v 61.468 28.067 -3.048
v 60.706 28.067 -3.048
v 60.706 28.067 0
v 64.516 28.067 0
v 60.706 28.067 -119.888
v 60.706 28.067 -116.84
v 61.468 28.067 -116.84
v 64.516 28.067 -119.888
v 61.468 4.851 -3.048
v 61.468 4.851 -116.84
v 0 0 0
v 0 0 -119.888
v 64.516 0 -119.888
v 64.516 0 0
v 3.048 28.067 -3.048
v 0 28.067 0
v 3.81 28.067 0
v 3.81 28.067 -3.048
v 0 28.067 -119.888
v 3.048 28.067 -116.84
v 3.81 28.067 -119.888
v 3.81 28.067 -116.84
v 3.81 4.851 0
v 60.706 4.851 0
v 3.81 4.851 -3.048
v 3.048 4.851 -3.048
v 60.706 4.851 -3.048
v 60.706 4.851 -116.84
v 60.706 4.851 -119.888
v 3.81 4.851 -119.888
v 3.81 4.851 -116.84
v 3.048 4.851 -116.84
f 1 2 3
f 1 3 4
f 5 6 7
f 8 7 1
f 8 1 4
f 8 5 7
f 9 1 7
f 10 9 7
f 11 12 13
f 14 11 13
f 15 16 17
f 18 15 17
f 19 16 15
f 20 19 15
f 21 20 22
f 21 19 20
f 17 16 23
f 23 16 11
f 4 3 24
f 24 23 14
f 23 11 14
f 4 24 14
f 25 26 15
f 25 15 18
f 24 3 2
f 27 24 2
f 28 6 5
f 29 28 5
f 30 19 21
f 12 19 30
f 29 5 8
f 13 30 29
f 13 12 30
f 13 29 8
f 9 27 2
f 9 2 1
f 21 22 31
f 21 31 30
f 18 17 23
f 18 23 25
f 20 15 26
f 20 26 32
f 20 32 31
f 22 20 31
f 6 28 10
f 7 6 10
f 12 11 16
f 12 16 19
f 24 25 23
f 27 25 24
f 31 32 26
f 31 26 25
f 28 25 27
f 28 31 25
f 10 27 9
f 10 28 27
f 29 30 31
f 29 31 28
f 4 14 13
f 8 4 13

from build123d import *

# Parameters (mm, degrees)
SKETCH1_W           = 64.516
SKETCH1_H           = 119.888
BOSS_EXTRUDE1_DEPTH = 28.067
SKETCH2_W           = 58.42
SKETCH2_H           = 113.792
CUT_EXTRUDE1_DEPTH  = 23.2156
SKETCH3_W           = 56.896
SKETCH3_H           = 3.048
CUT_EXTRUDE2_DEPTH  = 23.2156


with BuildPart() as part:
    # Sketch1 → Boss-Extrude1 (new body)
    with BuildSketch(Plane(origin=(0, 0, 0), x_dir=(1, 0, 0), z_dir=(0, 1, 0))):
        with Locations((32.258, 59.944)):
            Rectangle(SKETCH1_W, SKETCH1_H)
    extrude(amount=BOSS_EXTRUDE1_DEPTH)

    # Sketch2 → Cut-Extrude1 (cut)
    with BuildSketch(Plane(origin=(0, 28.067, 0), x_dir=(1, 0, 0), z_dir=(0, 1, 0))):
        with Locations((32.258, 59.944)):
            Rectangle(SKETCH2_W, SKETCH2_H)
    extrude(amount=-CUT_EXTRUDE1_DEPTH, mode=Mode.SUBTRACT)

    # Sketch3 → Cut-Extrude2 (cut)
    with BuildSketch(Plane(origin=(0, 28.067, 0), x_dir=(1, 0, 0), z_dir=(0, 1, 0))):
        with Locations((32.258, 118.364)):
            Rectangle(SKETCH3_W, SKETCH3_H)
        with Locations((32.258, 1.524)):
            Rectangle(SKETCH3_W, SKETCH3_H)
    extrude(amount=-CUT_EXTRUDE2_DEPTH, mode=Mode.SUBTRACT)


solid = part.part
